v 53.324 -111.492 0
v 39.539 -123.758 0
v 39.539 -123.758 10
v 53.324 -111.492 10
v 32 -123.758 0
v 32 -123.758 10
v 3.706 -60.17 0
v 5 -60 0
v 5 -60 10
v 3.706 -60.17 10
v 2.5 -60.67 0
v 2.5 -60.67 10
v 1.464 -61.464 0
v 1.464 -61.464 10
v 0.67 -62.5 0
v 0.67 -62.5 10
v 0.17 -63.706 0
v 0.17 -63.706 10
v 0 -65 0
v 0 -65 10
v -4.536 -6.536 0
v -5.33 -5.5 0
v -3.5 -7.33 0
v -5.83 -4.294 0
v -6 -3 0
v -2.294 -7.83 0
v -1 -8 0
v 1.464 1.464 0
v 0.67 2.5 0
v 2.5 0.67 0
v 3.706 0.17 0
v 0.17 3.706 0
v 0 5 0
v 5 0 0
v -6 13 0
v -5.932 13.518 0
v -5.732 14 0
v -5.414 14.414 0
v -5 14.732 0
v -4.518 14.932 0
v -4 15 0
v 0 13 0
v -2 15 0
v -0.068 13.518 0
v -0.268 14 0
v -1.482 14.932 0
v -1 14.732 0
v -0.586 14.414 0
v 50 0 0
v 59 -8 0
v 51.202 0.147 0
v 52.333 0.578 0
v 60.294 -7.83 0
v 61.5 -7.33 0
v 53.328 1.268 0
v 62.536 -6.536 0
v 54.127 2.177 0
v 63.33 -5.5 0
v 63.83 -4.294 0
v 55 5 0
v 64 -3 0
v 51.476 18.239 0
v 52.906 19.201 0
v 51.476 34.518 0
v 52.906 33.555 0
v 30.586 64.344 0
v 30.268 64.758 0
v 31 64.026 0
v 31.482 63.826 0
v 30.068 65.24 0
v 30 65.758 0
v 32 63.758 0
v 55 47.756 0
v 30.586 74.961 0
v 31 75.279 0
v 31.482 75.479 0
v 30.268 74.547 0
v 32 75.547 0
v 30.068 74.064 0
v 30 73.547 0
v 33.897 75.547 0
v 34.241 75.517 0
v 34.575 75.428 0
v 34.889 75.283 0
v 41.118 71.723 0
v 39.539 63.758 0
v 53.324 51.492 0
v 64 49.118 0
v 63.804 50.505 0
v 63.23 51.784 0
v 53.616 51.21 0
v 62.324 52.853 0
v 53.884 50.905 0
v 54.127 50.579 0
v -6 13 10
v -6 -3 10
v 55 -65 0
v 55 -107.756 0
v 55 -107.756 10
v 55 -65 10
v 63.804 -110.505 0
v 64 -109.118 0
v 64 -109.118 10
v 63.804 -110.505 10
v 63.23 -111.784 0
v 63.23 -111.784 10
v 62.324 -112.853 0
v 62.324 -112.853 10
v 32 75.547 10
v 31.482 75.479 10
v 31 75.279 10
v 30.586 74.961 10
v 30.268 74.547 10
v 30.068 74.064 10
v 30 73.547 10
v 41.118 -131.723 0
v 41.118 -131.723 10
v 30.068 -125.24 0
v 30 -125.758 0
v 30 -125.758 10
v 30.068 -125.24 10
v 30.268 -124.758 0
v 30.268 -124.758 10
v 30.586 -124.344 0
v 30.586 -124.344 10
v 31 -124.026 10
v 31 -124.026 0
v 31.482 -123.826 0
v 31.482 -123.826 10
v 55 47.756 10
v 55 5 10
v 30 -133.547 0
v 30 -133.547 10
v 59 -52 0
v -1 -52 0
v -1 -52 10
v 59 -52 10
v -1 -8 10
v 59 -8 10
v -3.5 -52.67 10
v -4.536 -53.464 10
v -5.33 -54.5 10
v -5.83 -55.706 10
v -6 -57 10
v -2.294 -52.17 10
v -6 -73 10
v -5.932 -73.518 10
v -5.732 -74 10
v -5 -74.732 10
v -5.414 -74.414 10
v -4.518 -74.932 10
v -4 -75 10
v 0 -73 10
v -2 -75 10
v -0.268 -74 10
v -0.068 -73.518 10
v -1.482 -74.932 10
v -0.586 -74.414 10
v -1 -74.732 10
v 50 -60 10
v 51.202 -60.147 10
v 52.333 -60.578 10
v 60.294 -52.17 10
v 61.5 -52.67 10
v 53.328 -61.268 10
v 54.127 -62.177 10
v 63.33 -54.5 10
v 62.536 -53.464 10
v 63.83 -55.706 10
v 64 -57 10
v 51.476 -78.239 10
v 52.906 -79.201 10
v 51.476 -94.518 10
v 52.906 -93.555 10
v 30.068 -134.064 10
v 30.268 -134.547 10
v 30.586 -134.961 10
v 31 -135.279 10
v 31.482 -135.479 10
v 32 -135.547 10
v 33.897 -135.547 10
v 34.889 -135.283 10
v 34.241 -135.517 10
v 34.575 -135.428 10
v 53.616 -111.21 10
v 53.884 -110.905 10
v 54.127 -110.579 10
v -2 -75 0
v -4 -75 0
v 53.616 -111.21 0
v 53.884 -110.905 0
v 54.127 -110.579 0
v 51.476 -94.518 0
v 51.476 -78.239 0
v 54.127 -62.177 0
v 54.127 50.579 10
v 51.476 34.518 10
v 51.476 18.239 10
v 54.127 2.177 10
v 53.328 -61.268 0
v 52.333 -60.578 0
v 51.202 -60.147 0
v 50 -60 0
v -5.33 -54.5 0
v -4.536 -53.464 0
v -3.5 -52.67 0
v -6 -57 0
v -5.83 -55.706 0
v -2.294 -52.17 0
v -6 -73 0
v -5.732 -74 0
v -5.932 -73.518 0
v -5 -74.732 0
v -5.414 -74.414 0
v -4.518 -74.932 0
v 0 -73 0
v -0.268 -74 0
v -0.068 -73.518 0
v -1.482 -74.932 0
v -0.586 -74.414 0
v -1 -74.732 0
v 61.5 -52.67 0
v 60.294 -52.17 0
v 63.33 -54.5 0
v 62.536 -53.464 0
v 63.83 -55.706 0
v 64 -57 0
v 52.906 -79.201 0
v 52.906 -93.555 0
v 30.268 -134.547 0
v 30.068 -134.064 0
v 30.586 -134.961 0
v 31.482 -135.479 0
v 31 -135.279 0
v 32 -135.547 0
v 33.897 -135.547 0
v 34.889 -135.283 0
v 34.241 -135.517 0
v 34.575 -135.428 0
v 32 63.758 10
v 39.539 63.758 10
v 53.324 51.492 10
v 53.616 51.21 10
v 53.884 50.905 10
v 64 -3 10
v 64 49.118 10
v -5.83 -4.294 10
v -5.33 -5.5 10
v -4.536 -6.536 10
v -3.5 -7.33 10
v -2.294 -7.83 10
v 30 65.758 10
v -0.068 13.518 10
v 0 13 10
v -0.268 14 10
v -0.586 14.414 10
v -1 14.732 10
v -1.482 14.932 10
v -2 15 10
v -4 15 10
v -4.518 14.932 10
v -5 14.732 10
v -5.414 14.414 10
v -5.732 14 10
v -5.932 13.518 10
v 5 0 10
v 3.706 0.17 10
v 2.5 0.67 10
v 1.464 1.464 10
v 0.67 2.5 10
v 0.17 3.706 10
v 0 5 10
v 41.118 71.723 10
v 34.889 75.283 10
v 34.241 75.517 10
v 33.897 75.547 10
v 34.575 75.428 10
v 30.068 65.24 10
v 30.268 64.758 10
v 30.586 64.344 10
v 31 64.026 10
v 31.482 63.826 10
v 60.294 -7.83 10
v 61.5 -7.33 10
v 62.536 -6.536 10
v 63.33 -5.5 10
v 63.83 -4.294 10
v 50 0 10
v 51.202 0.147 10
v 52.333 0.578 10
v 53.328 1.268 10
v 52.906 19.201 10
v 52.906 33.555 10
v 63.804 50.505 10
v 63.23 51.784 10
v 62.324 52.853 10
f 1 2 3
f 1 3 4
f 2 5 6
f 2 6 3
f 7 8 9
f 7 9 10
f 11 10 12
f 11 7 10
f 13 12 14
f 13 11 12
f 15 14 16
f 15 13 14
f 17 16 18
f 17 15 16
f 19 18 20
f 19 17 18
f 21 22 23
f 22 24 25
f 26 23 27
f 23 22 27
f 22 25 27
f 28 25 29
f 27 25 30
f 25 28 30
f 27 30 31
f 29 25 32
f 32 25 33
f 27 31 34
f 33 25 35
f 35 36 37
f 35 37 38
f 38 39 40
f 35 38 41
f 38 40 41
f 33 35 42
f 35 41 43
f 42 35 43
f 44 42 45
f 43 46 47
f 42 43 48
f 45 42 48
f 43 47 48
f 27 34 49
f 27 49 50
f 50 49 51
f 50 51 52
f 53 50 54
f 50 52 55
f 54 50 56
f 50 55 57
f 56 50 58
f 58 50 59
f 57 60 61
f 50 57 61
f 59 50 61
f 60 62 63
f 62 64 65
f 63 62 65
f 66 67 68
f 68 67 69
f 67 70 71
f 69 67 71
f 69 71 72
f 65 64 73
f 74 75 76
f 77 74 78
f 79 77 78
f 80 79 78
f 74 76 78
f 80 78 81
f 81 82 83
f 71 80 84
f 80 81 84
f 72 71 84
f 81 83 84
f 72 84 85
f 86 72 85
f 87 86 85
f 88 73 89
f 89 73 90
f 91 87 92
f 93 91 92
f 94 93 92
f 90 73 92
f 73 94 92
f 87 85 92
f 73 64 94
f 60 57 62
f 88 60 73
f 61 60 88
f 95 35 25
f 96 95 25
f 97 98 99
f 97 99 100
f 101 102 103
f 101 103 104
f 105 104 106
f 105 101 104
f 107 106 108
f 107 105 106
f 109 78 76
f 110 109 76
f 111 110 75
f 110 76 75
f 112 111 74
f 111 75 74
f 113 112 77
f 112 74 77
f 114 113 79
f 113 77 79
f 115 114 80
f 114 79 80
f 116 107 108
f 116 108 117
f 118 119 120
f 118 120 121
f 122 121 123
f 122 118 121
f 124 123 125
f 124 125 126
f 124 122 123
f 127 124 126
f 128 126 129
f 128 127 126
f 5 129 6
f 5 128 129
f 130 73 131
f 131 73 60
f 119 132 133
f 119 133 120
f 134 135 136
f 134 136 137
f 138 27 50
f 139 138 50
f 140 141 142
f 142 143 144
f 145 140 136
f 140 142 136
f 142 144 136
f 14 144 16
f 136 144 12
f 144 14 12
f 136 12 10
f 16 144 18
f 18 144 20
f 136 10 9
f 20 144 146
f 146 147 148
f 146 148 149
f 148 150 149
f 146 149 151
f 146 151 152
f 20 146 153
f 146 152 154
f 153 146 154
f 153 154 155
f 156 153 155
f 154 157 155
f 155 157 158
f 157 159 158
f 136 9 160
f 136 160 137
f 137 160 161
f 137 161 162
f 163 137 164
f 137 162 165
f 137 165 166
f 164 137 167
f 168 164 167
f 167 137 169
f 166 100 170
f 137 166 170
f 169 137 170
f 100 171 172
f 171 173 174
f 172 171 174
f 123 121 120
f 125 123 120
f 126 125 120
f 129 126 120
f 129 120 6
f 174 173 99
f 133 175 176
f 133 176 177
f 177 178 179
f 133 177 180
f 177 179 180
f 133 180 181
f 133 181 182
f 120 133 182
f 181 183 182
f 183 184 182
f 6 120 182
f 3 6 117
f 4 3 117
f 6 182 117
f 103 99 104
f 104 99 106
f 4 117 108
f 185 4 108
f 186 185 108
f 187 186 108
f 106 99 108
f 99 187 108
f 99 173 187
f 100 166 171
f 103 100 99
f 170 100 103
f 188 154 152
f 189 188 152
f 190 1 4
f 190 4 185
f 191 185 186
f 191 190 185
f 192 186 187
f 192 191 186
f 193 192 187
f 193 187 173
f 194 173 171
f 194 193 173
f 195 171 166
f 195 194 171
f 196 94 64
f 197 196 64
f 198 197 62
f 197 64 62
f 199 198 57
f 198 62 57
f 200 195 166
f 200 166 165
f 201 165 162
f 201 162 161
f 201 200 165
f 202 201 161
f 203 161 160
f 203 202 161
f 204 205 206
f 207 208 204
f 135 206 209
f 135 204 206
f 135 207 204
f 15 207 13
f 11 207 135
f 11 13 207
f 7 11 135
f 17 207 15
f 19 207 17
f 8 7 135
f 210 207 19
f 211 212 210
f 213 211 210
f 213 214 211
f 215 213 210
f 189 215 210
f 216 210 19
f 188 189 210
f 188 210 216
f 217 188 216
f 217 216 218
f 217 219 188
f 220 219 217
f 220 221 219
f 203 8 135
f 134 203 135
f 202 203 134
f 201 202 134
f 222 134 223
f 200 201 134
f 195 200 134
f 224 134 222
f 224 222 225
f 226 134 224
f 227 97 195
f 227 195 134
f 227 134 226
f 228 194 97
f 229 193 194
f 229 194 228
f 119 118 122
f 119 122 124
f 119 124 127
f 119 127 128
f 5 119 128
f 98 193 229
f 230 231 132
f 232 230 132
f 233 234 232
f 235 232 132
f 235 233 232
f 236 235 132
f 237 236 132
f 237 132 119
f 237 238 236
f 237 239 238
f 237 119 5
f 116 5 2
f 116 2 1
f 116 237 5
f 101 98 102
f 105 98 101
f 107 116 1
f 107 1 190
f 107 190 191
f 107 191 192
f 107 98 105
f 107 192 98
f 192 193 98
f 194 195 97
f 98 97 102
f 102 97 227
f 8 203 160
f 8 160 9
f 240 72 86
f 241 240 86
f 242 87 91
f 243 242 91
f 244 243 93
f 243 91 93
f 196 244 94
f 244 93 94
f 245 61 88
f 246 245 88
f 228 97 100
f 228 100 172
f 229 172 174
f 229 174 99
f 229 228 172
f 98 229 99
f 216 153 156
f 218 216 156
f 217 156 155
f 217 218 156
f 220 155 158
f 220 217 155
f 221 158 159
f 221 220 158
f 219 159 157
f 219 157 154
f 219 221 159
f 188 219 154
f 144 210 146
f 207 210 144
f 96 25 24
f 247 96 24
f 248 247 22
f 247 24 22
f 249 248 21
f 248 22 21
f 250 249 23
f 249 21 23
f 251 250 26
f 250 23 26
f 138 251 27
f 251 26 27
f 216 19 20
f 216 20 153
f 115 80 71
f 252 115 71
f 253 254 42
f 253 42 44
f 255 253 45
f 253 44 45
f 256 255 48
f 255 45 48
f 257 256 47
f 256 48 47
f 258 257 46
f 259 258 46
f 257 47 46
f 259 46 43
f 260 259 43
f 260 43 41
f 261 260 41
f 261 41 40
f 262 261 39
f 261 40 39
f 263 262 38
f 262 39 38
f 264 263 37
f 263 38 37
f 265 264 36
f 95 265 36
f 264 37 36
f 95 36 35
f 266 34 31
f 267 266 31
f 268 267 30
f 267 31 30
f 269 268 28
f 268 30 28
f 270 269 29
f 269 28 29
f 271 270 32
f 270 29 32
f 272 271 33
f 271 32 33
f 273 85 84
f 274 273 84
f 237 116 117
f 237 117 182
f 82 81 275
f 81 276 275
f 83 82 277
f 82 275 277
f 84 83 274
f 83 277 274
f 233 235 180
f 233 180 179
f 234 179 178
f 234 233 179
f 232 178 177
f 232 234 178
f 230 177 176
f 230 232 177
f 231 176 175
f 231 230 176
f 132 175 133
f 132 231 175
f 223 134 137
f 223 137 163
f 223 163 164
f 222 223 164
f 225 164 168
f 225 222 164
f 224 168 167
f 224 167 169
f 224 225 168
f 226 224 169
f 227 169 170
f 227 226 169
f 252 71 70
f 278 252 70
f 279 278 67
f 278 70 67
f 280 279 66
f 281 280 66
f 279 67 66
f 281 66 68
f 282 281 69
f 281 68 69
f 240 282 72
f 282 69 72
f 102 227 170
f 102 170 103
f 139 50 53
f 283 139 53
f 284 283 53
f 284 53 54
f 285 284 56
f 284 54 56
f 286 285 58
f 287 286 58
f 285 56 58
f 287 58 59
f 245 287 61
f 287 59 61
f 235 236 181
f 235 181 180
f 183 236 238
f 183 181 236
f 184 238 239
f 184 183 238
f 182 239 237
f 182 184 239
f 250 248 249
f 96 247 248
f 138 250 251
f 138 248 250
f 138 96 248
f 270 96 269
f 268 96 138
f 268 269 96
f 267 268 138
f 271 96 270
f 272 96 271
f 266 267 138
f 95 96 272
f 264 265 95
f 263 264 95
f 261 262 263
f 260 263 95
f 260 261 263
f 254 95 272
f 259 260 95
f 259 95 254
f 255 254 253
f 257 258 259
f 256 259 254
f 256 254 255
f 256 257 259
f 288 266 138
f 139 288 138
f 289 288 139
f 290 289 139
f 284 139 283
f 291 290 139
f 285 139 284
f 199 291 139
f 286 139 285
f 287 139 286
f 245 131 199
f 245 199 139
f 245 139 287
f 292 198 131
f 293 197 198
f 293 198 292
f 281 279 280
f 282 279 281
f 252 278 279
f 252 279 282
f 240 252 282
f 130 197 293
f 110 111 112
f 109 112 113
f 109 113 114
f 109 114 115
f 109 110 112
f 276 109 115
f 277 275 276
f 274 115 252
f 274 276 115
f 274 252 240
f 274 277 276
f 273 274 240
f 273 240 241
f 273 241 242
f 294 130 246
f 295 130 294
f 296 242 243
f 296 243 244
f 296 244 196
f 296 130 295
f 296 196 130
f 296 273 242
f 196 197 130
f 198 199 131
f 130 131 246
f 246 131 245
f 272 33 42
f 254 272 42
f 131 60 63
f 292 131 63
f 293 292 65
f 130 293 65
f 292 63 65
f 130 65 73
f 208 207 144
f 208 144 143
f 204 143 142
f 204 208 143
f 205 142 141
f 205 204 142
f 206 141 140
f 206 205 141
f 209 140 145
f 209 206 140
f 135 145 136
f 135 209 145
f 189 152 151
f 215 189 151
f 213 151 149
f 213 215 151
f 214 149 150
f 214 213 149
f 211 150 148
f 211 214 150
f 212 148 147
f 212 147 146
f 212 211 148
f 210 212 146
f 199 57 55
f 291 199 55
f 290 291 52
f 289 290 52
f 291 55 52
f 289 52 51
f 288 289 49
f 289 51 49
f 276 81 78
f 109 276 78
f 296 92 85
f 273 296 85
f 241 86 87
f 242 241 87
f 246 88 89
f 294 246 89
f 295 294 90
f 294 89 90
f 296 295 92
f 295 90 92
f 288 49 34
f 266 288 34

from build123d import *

# Parameters (mm, degrees)
F1_DEPTH = 10
F2_R     = 2


with BuildPart() as f1:
    # F0 (on Top) → F1 (new body)
    with BuildSketch(Plane.XY):
        with BuildLine():
            Line((0, 5), (0, 13))
            ThreePointArc((0, 13), (-0.5857864376, 14.4142135624), (-2, 15))
            Line((-2, 15), (-4, 15))
            ThreePointArc((-4, 15), (-5.4142135624, 14.4142135624), (-6, 13))
            Line((-6, 13), (-6, -3))
            ThreePointArc((-6, -3), (-4.5355339059, -6.5355339059), (-1, -8))
            Line((-1, -8), (59, -8))
            ThreePointArc((59, -8), (62.5355339059, -6.5355339059), (64, -3))
            Line((64, -3), (64, 49.1177613581))
            ThreePointArc((64, 49.1177613581), (63.5617552688, 51.164805292), (62.3238444529, 52.8530067386))
            Line((62.3238444529, 52.8530067386), (41.117766383, 71.7234416849))
            Line((41.117766383, 71.7234416849), (34.4277384529, 75.5467076555))
            Line((34.4277384529, 75.5467076555), (32, 75.5467076555))
            ThreePointArc((32, 75.5467076555), (30.5857864376, 74.9609212178), (30, 73.5467076555))
            Line((30, 73.5467076555), (30, 71.4909657836))
            Line((30, 71.4909657836), (30, 66.5854863102))
            Line((30, 66.5854863102), (30, 65.75772506))
            ThreePointArc((30, 65.75772506), (30.5857864376, 64.3435114976), (32, 63.75772506))
            Line((32, 63.75772506), (33.0982006717, 63.75772506))
            Line((33.0982006717, 63.75772506), (39.5394453007, 63.75772506))
            Line((39.5394453007, 63.75772506), (53.3238444529, 51.4915433258))
            ThreePointArc((53.3238444529, 51.4915433258), (53.7532179323, 51.0598347094), (54.1269336048, 50.5791367685))
            ThreePointArc((54.1269336048, 50.5791367685), (51.143371317, 26.3781489726), (54.1269336048, 2.1771611768))
            ThreePointArc((54.1269336048, 2.1771611768), (52.333002988, 0.5776593236), (50, 0))
            Line((50, 0), (5, 0))
            ThreePointArc((5, 0), (1.4644660941, 1.4644660941), (0, 5))
        make_face()
        with BuildLine():
            Line((55, 47.7562979452), (55, 5))
            ThreePointArc((55, 5), (52.643371317, 26.3781489726), (55, 47.7562979452))
        make_face(mode=Mode.SUBTRACT)
    extrude(amount=F1_DEPTH)

    # F2
    f2_edges = [f1.edges().sort_by_distance(p)[0] for p in [
        (34.427738, 75.546708, 5),
    ]]
    fillet(f2_edges, radius=F2_R)


with BuildPart() as f4_1:
    # F4: instance of F1
    add(f1.part.mirror(Plane.XZ.offset(30)))


solid = Compound([f1.part, f4_1.part])
